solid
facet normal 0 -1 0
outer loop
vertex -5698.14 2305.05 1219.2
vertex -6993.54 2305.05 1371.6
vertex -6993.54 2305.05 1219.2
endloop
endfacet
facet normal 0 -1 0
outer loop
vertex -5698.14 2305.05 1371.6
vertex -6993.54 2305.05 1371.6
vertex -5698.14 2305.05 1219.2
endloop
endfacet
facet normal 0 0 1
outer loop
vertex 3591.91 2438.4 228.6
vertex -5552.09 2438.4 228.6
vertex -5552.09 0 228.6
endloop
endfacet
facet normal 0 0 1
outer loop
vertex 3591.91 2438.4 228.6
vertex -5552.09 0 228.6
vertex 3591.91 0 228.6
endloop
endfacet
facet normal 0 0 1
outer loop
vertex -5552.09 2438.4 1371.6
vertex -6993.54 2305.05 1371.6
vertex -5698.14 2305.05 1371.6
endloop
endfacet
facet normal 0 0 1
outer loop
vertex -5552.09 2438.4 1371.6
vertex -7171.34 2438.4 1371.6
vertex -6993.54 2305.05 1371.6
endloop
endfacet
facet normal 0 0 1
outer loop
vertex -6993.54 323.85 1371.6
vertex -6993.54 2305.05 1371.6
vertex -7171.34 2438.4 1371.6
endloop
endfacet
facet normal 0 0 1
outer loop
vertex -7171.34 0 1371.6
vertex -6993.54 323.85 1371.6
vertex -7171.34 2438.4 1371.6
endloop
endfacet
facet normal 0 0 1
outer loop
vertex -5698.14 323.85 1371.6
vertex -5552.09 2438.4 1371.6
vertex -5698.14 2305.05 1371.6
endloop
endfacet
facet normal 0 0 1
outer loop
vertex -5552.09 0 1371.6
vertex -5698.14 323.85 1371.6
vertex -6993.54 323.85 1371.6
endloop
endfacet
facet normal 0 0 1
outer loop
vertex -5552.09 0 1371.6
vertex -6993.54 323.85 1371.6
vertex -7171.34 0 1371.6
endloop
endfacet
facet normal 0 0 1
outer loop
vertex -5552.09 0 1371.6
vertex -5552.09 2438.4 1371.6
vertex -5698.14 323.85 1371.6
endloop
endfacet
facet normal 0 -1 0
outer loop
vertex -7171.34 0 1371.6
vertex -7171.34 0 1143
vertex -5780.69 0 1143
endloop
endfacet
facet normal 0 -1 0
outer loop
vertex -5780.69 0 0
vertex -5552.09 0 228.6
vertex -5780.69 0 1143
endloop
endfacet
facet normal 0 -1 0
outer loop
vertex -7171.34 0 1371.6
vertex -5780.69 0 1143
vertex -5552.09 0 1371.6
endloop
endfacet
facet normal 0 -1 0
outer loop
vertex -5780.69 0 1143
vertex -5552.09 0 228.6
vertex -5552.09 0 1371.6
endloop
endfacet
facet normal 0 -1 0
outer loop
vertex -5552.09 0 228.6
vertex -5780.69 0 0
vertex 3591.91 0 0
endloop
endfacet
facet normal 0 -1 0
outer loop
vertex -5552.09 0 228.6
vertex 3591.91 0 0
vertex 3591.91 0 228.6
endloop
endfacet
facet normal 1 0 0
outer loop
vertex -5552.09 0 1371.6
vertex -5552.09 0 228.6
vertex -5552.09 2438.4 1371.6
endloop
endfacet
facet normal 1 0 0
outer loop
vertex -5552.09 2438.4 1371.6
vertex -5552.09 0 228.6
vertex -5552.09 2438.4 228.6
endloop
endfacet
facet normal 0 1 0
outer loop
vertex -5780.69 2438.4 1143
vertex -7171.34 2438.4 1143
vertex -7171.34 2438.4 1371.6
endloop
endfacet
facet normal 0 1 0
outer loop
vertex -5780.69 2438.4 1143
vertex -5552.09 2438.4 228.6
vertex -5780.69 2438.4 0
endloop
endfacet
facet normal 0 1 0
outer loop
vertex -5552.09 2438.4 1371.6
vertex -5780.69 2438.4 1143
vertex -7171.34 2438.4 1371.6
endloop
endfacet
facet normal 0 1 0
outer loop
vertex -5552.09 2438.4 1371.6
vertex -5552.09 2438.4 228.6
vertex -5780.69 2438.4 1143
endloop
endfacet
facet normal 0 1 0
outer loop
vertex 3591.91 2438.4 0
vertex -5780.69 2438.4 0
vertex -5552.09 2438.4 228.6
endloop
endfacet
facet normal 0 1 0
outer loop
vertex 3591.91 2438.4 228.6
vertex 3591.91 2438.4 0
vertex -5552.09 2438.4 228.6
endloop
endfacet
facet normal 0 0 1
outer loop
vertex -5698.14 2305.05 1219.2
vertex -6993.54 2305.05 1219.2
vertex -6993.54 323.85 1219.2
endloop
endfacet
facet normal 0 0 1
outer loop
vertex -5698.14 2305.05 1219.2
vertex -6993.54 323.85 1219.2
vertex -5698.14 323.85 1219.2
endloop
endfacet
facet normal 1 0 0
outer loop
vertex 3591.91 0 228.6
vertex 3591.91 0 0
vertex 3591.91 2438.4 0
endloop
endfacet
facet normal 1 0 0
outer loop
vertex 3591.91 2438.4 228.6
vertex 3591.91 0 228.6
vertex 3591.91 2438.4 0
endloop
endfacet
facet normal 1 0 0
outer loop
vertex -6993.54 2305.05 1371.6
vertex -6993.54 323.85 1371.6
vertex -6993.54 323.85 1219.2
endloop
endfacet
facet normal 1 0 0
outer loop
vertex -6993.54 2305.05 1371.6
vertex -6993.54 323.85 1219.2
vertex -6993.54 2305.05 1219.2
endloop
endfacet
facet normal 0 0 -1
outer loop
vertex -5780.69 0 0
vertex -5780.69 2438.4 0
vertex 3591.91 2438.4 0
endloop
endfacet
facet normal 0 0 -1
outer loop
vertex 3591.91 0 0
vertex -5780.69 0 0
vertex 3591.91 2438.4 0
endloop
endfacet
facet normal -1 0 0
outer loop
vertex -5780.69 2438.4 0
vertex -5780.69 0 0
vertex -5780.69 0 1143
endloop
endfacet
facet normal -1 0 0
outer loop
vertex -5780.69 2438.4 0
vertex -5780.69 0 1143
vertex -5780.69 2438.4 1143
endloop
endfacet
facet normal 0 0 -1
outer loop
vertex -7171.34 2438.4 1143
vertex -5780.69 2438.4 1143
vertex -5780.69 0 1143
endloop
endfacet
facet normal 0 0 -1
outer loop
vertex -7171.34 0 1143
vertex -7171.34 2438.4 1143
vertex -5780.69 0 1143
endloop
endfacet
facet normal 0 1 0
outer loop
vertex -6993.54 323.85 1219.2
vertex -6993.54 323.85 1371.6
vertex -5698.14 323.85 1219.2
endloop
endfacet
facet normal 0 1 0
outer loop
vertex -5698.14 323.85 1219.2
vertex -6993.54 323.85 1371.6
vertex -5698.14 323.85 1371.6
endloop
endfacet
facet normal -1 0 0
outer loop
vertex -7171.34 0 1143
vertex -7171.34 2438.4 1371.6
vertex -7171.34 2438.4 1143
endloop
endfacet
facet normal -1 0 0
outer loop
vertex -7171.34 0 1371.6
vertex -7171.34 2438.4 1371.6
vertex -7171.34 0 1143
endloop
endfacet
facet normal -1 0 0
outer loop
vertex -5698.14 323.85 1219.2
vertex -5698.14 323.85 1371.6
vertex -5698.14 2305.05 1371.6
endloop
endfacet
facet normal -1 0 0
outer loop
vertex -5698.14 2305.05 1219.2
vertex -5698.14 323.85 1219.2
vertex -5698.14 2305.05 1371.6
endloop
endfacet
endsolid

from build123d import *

# Parameters (mm, degrees)
F0_W     = 9372.6
F0_H     = 2438.4
F1_DEPTH = 228.6
F2_W     = 228.6
F2_H     = 2438.4
F3_DEPTH = 1143
F4_W     = 2438.4
F4_H     = 228.6
F5_DEPTH = 1390.65
F6_W     = 1295.4
F6_H     = 1981.2
F7_DEPTH = 152.4


with BuildPart() as f1:
    # F0 (on Top) → F1 (new body)
    with BuildSketch(Plane.XY):
        with Locations((-1094.389941, 1219.2)):
            Rectangle(F0_W, F0_H)
    extrude(amount=F1_DEPTH)

    # F2 (on face) → F3 (join)
    with BuildSketch(Plane.XY.offset(228.6)):
        with Locations((-5666.389941, 1219.2)):
            Rectangle(F2_W, F2_H)
    extrude(amount=F3_DEPTH)

    # F4 (on face) → F5 (join)
    with BuildSketch(Plane(origin=(-5780.689941, 0, 0), x_dir=(0, -1, 0), z_dir=(-1, 0, 0))):
        with Locations((-1219.2, 1257.3)):
            Rectangle(F4_W, F4_H)
    extrude(amount=F5_DEPTH)

    # F6 (on face) → F7 (cut)
    with BuildSketch(Plane.XY.offset(1371.6)):
        with Locations((-6345.839941, 1314.45)):
            Rectangle(F6_W, F6_H)
    extrude(amount=-F7_DEPTH, mode=Mode.SUBTRACT)


solid = f1.part
